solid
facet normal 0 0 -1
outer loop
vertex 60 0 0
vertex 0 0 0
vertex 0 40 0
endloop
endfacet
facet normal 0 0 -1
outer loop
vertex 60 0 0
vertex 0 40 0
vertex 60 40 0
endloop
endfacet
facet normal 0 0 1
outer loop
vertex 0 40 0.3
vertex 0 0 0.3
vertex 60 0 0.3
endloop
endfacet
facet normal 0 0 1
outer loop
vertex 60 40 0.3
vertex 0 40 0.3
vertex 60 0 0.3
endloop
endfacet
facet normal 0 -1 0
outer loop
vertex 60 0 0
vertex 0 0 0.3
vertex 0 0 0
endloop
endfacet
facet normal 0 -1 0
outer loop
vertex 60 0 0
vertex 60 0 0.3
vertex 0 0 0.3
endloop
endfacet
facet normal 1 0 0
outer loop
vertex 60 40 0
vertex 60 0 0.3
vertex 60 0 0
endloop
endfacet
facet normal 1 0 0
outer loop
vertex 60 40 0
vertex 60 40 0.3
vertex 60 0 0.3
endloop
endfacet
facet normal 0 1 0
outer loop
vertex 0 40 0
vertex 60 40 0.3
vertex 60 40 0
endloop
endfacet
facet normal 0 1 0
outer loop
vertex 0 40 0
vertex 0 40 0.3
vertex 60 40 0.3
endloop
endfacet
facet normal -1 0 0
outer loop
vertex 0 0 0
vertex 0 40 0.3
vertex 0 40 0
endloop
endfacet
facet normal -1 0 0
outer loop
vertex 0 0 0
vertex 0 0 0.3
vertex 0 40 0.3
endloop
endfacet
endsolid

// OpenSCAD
// First-layer Z-offset verification coupon
// A big flat 60x40x0.3 plate. Prints one layer. Exists ONLY to confirm the
// nozzle squishes and lays down a continuous first layer at the baked z_offset.
// 0.3mm tall so a 0.2 or 0.28 first-layer slice drops a proper single skin.
module z_coupon() {
    linear_extrude(height = 0.3)
        square([60, 40]);
}
z_coupon();
